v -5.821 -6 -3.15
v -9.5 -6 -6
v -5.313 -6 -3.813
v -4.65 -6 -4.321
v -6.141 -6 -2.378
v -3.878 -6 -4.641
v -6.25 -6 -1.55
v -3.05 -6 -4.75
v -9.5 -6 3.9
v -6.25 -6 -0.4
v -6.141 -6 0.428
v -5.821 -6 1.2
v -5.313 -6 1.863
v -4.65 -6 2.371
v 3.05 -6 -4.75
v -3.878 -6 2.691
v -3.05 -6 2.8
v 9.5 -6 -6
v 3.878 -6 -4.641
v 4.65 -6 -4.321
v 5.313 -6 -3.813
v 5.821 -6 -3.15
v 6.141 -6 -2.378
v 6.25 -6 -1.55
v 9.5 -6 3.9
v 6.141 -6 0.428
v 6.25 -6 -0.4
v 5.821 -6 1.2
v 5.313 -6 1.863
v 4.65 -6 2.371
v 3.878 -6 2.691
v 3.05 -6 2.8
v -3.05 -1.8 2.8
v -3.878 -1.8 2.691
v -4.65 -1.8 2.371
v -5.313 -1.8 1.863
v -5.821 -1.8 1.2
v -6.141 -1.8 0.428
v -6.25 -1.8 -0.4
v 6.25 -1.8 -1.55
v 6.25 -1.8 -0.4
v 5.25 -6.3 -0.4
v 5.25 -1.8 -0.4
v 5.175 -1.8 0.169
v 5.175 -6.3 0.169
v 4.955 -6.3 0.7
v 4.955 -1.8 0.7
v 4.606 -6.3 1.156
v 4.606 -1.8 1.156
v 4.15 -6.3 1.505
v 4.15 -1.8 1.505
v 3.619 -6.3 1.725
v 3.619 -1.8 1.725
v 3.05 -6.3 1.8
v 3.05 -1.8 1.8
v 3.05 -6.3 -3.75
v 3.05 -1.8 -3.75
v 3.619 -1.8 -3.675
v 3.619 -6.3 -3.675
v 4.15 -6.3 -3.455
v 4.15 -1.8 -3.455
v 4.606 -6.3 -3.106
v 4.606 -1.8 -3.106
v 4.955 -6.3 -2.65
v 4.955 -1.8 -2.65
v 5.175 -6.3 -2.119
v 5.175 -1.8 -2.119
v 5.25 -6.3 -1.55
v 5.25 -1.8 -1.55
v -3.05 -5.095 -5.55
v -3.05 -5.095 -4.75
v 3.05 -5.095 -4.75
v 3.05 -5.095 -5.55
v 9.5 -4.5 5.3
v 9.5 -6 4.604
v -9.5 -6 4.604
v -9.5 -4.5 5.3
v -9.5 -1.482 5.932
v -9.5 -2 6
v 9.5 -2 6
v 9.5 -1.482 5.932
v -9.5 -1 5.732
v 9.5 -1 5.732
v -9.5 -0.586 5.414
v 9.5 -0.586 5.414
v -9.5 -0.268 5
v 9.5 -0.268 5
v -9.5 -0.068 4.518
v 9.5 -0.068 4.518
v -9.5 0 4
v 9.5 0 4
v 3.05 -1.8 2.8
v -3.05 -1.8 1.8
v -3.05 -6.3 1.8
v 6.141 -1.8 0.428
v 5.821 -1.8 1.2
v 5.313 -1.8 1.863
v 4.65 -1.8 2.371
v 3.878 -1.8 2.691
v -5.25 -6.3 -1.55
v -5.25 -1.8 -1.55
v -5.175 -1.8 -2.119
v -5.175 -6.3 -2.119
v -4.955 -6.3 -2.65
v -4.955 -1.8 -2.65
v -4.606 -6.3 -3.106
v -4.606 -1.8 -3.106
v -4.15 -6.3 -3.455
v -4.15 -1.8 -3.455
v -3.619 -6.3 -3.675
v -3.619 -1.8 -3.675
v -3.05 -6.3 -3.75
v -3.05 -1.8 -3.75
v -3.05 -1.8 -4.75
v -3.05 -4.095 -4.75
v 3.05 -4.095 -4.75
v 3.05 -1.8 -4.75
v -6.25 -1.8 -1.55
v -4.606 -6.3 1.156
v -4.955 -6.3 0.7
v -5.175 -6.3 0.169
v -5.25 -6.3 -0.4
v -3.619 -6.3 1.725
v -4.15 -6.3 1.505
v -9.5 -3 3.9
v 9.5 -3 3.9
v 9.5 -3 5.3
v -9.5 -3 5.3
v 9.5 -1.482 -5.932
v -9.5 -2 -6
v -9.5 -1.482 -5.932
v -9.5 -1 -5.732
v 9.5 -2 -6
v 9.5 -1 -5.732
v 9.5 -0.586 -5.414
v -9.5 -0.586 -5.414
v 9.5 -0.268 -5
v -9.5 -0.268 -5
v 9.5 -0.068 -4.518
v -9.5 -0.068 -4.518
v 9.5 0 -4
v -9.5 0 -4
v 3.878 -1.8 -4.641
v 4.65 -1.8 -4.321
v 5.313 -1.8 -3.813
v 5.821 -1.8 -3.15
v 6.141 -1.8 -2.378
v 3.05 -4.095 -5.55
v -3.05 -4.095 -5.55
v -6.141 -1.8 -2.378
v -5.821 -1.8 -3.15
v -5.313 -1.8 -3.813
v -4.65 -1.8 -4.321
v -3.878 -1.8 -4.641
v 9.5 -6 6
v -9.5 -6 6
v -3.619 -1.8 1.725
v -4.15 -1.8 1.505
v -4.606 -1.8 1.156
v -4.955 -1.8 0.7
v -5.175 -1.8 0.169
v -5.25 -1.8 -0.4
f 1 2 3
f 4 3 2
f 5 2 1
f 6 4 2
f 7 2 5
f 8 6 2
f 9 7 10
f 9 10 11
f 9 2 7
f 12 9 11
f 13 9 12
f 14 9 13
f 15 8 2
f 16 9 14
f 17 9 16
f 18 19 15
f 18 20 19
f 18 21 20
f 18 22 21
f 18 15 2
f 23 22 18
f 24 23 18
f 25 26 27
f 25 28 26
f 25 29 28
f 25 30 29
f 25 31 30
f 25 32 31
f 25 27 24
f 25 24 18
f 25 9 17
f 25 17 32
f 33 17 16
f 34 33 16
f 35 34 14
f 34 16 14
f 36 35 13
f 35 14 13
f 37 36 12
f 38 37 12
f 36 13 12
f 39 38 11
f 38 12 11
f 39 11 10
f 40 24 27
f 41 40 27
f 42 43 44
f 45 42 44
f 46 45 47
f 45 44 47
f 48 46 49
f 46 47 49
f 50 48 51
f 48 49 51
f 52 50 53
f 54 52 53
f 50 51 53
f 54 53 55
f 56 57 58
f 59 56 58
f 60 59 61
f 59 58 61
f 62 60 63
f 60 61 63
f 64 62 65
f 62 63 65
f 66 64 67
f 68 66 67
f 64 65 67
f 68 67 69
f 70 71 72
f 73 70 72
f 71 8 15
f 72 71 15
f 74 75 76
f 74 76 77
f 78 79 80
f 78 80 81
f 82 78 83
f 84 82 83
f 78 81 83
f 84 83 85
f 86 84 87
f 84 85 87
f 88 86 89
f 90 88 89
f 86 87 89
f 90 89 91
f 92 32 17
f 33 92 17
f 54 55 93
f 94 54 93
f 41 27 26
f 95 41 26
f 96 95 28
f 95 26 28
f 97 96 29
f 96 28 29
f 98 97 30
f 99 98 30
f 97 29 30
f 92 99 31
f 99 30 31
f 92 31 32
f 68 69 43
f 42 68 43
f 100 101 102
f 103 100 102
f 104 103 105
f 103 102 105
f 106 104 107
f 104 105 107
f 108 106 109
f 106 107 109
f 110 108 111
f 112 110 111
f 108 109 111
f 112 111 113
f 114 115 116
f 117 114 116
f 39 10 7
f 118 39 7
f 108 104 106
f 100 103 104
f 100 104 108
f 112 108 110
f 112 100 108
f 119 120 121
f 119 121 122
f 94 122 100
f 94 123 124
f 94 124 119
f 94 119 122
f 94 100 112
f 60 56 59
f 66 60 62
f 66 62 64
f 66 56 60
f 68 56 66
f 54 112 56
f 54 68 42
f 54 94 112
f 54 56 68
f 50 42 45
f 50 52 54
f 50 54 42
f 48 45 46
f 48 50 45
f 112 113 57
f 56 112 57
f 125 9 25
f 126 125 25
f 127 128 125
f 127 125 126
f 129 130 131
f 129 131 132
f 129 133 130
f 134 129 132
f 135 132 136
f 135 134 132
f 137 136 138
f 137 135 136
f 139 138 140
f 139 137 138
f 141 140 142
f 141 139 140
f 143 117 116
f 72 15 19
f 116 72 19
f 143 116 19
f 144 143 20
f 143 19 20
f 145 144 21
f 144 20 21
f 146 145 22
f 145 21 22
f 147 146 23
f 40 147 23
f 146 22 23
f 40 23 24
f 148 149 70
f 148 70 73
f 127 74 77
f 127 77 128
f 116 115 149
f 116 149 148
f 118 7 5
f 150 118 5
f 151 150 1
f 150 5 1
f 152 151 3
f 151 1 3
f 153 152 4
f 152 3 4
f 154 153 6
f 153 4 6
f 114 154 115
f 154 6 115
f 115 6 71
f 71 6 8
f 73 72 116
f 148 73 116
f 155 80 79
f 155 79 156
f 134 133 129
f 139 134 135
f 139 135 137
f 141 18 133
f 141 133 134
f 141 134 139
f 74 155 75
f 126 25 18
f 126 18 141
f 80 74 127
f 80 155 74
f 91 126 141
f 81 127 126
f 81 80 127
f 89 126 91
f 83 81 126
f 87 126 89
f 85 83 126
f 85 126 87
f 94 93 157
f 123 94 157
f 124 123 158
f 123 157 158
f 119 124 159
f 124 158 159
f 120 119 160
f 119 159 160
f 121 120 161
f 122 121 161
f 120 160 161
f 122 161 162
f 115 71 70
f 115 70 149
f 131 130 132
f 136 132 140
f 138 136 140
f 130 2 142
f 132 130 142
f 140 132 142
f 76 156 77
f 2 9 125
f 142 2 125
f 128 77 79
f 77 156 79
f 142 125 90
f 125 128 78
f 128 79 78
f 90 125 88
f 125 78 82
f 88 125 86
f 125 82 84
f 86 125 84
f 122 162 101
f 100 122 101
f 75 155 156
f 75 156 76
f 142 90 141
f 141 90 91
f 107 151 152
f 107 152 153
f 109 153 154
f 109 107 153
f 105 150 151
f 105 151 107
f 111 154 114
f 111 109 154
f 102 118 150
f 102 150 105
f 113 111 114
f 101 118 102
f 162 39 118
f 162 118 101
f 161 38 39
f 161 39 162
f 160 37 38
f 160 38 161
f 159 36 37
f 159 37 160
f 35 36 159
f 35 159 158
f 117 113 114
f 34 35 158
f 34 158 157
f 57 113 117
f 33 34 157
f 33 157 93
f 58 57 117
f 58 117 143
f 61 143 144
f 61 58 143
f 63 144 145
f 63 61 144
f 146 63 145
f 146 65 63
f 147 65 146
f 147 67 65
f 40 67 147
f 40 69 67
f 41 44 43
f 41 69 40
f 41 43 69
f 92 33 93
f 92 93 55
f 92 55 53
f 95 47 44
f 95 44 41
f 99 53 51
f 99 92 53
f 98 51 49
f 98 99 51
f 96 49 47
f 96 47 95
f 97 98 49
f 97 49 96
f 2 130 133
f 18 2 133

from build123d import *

# Parameters (mm, degrees)
F0_W      = 19
F0_H      = 12
F1_DEPTH  = 6
F3_DEPTH  = 4.2
F2_W      = 19
F2_H      = 2.1
F4_DEPTH  = 3
F6_DEPTH  = 19
F7_R      = 2
F8_W      = 6.1
F8_H      = 1
F9_DEPTH  = 0.8
F11_DEPTH = 4.5


with BuildPart() as f1:
    # F0 (on Front) → F1 (new body)
    with BuildSketch(Plane.XZ):
        Rectangle(F0_W, F0_H)
    extrude(amount=F1_DEPTH)

    # F2 (on face) → F3 (cut)
    with BuildSketch(Plane.XZ.offset(6)):
        with BuildLine():
            ThreePointArc((6.25, -0.4), (5.312742, 1.862742), (3.05, 2.8))
            Line((3.05, 2.8), (-3.05, 2.8))
            ThreePointArc((-3.05, 2.8), (-5.312742, 1.862742), (-6.25, -0.4))
            Line((-6.25, -0.4), (-6.25, -1.55))
            ThreePointArc((-6.25, -1.55), (-5.312742, -3.812742), (-3.05, -4.75))
            Line((-3.05, -4.75), (3.05, -4.75))
            ThreePointArc((3.05, -4.75), (5.312742, -3.812742), (6.25, -1.55))
            Line((6.25, -1.55), (6.25, -0.4))
        make_face()
    extrude(amount=-F3_DEPTH, mode=Mode.SUBTRACT)

    # F2 (on face) → F4 (cut)
    with BuildSketch(Plane.XZ.offset(6)):
        with Locations((0, 4.95)):
            Rectangle(F2_W, F2_H)
    extrude(amount=-F4_DEPTH, mode=Mode.SUBTRACT)

    # F5 (on face) → F6 (join, through all)
    with BuildSketch(Plane.YZ.offset(9.5)):
        Polygon((-3, 5.3), (-3, 6), (-6, 6), (-6, 5.3), (-4.5, 5.3), align=None)
        Polygon((-4.5, 5.3), (-6, 5.3), (-6, 4.60372), align=None)
    extrude(amount=-F6_DEPTH)

    # F7
    f7_edges = [f1.edges().sort_by_distance(p)[0] for p in [
        (0, 0, 6),
        (0, 0, -6),
    ]]
    fillet(f7_edges, radius=F7_R)

    # F8 (on face) → F9 (cut)
    with BuildSketch(Plane.XY.offset(-4.75)):
        with Locations((0, -4.594713)):
            Rectangle(F8_W, F8_H)
    extrude(amount=-F9_DEPTH, mode=Mode.SUBTRACT)

    # F10 (on face) → F11 (join)
    with BuildSketch(Plane.XZ.offset(1.8)):
        with BuildLine():
            Line((-5.25, -0.4), (-5.25, -1.55))
            ThreePointArc((-5.25, -1.55), (-4.605635, -3.105635), (-3.05, -3.75))
            Line((-3.05, -3.75), (3.05, -3.75))
            ThreePointArc((3.05, -3.75), (4.605635, -3.105635), (5.25, -1.55))
            Line((5.25, -1.55), (5.25, -0.4))
            ThreePointArc((5.25, -0.4), (4.605635, 1.155635), (3.05, 1.8))
            Line((3.05, 1.8), (-3.05, 1.8))
            ThreePointArc((-3.05, 1.8), (-4.605635, 1.155635), (-5.25, -0.4))
        make_face()
    extrude(amount=F11_DEPTH)


solid = f1.part
